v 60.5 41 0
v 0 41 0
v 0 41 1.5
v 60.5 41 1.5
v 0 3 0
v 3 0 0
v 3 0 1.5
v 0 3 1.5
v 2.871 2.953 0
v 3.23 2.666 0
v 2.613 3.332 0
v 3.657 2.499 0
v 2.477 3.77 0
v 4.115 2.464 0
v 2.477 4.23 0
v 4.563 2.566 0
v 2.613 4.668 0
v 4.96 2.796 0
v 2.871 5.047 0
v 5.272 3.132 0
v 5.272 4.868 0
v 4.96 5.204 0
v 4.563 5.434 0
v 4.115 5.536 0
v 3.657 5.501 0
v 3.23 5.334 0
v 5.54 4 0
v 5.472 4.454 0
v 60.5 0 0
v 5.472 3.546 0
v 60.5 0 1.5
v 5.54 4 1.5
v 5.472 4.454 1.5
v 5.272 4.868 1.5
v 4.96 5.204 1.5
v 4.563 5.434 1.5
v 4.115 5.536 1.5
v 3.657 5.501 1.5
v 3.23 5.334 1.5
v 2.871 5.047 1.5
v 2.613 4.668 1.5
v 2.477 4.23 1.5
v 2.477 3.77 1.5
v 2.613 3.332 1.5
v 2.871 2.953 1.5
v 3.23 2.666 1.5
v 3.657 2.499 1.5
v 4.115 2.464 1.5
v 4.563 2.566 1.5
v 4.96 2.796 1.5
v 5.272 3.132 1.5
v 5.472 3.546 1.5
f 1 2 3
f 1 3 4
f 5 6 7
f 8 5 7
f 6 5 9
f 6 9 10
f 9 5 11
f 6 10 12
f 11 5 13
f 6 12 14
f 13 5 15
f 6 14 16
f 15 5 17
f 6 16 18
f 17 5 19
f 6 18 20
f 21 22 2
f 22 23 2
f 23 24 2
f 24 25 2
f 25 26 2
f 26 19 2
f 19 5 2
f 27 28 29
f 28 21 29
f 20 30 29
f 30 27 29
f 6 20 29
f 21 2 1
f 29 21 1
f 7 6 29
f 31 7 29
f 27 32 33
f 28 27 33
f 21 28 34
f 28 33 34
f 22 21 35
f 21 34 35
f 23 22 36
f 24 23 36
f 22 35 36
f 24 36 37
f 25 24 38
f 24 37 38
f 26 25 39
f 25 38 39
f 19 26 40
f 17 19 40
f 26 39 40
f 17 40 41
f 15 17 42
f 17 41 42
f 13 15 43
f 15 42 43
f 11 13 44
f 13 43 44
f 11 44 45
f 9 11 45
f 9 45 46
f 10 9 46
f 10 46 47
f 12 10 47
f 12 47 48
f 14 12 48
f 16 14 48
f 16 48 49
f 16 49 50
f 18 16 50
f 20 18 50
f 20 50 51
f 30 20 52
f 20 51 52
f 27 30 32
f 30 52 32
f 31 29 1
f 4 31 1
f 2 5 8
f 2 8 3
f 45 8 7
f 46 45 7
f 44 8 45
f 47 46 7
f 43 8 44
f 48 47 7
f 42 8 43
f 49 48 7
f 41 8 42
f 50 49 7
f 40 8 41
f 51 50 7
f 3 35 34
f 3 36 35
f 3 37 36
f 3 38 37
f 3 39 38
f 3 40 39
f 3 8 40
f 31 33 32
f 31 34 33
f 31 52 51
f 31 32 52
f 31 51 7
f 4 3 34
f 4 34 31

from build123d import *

# Parameters (mm, degrees)
F0_W     = 60.5
F0_H     = 41
F1_DEPTH = 1.5
F2_SIZE  = 3
F3_R     = 1.54
F4_DEPTH = 1.5


with BuildPart() as f1:
    # F0 (on Top) → F1 (new body)
    with BuildSketch(Plane.XY):
        with Locations((30.25, 20.5)):
            Rectangle(F0_W, F0_H)
    extrude(amount=F1_DEPTH)

    # F2
    f2_edges = [f1.edges().sort_by_distance(p)[0] for p in [
        (0, 0, 0.75),
    ]]
    chamfer(f2_edges, length=F2_SIZE)

    # F3 (on face) → F4 (cut, through all)
    with BuildSketch(Plane.XY.offset(1.5)):
        with Locations((4, 4)):
            Circle(F3_R)
    extrude(amount=-F4_DEPTH, mode=Mode.SUBTRACT)


solid = f1.part
